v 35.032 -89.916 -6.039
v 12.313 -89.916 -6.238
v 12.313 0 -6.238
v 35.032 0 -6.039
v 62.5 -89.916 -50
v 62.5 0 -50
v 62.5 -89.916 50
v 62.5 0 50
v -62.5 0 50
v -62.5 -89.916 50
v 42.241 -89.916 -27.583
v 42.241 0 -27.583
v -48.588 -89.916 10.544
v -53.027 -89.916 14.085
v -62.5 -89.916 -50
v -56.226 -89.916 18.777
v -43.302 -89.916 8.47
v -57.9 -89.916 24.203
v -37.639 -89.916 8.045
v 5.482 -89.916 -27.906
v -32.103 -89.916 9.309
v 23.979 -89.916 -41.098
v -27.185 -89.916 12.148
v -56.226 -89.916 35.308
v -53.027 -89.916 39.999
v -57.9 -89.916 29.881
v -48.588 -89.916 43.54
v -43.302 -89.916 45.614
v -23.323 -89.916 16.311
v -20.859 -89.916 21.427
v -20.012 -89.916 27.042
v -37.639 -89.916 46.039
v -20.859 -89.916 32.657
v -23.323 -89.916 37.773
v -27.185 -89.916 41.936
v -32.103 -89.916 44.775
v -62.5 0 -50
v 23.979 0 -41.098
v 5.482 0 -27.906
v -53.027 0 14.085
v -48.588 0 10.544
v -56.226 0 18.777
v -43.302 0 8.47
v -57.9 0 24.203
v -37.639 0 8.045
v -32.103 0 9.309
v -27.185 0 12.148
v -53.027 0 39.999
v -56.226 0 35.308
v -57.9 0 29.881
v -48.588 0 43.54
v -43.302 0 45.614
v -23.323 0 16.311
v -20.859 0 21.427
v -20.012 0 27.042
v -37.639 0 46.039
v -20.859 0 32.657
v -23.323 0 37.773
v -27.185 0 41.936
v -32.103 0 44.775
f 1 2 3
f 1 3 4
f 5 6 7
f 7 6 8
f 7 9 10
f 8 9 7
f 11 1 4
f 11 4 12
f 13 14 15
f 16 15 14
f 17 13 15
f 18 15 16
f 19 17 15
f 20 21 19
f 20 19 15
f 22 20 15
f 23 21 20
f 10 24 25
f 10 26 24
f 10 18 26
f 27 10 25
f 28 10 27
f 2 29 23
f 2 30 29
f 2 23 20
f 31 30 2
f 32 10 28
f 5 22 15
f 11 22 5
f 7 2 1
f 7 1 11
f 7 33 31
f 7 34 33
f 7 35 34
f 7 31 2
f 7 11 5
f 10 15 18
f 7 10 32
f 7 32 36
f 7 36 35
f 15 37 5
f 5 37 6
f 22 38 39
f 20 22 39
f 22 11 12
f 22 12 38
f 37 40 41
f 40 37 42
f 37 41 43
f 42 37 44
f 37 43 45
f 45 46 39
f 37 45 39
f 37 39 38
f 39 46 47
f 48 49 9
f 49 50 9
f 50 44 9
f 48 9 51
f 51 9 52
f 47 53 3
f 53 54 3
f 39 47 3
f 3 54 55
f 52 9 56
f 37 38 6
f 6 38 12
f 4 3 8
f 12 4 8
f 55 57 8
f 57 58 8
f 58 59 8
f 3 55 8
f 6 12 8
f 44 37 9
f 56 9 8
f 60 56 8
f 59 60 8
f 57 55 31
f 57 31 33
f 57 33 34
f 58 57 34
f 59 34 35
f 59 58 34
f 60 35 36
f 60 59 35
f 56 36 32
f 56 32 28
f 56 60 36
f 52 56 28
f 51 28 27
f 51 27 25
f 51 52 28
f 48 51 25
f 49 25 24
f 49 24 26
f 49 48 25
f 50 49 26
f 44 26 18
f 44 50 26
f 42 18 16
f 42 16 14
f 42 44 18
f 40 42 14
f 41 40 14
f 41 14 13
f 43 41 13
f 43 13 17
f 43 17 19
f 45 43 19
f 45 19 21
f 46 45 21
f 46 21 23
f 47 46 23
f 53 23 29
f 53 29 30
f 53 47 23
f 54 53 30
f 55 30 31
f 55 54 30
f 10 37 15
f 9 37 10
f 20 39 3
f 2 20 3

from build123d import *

# Parameters (mm, degrees)
F0_W     = 125
F0_H     = 100
F0_R     = 19.05
F1_DEPTH = 89.916


with BuildPart() as f1:
    # F0 (on Front) → F1 (new body)
    with BuildSketch(Plane.XZ):
        Rectangle(F0_W, F0_H)
        Polygon((35.031748, -6.038517), (42.241403, -27.583478), (23.978834, -41.098026), (5.48229, -27.905516), (12.313367, -6.237548), align=None, mode=Mode.SUBTRACT)
        with Locations((-39.0625, 27.042078)):
            Circle(F0_R, mode=Mode.SUBTRACT)
    extrude(amount=F1_DEPTH)


solid = f1.part
